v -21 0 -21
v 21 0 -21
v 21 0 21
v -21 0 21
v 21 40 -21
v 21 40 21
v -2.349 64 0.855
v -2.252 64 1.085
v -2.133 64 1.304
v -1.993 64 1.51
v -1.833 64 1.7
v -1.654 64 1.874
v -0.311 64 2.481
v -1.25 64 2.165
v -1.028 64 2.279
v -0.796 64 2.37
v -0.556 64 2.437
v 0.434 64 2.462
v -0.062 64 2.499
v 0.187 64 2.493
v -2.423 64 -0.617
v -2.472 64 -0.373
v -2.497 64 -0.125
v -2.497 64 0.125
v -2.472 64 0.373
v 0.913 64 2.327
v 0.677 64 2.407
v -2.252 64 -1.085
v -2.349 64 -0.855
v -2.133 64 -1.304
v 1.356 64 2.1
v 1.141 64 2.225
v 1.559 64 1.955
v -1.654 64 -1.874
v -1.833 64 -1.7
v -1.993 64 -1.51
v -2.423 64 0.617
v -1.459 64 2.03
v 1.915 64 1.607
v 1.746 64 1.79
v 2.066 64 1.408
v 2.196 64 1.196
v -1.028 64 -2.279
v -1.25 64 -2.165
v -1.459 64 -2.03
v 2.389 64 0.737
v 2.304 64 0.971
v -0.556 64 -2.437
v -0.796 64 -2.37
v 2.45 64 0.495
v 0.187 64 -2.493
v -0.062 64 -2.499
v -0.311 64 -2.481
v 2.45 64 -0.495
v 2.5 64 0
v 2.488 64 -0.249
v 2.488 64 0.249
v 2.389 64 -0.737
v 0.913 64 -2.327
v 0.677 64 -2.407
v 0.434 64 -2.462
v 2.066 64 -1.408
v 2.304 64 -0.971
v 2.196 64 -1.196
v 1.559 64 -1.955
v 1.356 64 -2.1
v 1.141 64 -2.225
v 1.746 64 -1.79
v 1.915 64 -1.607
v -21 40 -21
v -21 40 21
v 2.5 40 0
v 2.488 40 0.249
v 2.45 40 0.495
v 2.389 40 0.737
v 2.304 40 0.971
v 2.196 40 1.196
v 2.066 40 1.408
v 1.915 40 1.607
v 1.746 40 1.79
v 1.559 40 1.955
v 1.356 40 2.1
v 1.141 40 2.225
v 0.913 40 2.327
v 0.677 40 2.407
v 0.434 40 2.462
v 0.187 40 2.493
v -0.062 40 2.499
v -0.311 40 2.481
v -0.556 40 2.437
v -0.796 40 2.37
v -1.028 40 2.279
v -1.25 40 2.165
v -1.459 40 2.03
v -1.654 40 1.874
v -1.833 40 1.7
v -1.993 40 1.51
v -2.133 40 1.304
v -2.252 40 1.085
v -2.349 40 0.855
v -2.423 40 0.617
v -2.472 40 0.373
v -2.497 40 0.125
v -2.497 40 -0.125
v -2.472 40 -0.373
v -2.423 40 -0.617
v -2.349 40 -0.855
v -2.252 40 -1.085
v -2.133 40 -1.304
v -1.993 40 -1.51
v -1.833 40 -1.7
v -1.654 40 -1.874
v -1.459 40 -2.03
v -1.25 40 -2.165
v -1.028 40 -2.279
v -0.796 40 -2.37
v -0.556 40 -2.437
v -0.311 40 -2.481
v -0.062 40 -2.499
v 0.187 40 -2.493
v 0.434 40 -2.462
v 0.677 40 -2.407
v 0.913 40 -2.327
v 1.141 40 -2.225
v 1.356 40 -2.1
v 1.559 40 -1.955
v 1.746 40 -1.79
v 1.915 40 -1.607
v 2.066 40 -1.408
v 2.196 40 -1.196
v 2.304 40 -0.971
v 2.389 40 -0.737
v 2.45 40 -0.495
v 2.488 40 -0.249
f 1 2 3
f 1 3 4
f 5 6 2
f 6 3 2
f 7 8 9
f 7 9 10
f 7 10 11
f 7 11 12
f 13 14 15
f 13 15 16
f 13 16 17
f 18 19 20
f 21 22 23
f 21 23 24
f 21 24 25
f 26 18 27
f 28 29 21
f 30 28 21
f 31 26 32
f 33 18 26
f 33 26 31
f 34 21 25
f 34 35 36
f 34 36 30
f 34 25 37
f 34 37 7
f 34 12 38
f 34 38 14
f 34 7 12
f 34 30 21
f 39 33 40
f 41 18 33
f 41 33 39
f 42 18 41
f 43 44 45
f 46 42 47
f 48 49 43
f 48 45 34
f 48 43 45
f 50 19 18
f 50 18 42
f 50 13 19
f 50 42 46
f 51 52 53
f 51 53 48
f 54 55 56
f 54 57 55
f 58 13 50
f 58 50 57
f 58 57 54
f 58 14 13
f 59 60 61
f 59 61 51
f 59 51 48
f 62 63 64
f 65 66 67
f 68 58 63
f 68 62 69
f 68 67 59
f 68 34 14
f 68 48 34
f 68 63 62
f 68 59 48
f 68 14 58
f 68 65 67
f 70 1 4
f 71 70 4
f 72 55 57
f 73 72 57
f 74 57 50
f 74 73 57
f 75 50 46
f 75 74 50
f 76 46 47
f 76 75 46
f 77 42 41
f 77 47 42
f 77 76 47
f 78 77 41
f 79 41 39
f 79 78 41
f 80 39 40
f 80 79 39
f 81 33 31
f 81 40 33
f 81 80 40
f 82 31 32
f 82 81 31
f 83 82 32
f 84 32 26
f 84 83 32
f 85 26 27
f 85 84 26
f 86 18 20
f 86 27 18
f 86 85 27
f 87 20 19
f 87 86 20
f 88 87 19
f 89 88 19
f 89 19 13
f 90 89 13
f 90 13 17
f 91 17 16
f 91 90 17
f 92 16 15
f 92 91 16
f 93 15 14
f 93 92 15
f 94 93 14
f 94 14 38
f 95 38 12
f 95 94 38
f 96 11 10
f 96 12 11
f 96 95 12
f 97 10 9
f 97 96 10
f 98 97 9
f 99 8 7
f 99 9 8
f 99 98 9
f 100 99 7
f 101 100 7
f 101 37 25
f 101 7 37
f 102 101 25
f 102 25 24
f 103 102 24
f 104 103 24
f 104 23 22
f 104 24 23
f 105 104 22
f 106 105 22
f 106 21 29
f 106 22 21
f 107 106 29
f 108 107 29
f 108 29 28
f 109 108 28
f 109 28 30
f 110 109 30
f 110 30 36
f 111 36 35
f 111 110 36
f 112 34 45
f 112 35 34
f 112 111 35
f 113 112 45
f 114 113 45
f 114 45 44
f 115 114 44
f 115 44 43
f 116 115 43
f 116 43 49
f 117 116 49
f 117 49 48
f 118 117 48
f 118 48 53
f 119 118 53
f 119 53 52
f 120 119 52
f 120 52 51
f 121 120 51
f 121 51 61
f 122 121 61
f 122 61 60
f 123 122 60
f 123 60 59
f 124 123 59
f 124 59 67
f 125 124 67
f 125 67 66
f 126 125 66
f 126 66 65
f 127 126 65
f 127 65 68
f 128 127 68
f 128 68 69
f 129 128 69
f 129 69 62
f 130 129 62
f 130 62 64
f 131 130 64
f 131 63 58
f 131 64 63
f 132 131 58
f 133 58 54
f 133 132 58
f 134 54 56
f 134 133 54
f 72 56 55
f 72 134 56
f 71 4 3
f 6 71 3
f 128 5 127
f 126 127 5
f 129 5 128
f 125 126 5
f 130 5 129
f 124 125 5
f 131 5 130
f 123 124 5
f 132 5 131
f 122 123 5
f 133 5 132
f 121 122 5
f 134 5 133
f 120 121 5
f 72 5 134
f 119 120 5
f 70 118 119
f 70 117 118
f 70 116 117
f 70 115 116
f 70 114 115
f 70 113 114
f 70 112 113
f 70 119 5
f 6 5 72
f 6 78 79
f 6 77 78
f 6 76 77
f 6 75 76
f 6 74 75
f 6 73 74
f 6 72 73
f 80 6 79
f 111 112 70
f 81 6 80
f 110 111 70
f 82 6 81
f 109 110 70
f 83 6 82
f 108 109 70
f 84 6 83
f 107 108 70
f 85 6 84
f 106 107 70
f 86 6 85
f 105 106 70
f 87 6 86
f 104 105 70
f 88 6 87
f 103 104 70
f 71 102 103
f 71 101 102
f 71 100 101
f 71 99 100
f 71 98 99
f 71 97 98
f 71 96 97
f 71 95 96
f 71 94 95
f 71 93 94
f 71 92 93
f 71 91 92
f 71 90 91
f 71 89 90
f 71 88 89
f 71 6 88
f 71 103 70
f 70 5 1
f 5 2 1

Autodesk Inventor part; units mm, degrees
ref_plane "YZ Plane" through (0, 0, 0) normal (1, 0, 0) x (0, 1, 0)
ref_plane "XZ Plane" through (0, 0, 0) normal (0, 1, 0) x (-1, 0, 0)
ref_plane "XY Plane" through (0, 0, 0) normal (0, 0, 1) x (1, 0, 0)
sketch "Szkic1" plane through (0, 0, 0) normal (0, 1, 0) x (-1, 0, 0)
  line L0 (21, 21) -> (-21, 21)
  line L1 (-21, 21) -> (-21, -21)
  line L2 (-21, -21) -> (21, -21)
  line L3 (21, -21) -> (21, 21)
  line L4 (21, 21) -> (-21, -21)
  line L5 (21, -21) -> (-21, 21)
  point P0 (0, 0)
  point P1 (0, 0)
  dimension "d0" = 42
  dimension "d1" = 42
extrude "Wyciągnięcie proste1" add sketch "Szkic1" along normal blind 40
sketch "Szkic2" plane through (0, 40, 0) normal (0, 1, 0) x (1, 0, 0)
  circle A0 centre (0, 0) radius 2.5
  dimension "d4" = 5
extrude "Wyciągnięcie proste2" add sketch "Szkic2" along normal blind 24
properties part number "Stepper_model"
